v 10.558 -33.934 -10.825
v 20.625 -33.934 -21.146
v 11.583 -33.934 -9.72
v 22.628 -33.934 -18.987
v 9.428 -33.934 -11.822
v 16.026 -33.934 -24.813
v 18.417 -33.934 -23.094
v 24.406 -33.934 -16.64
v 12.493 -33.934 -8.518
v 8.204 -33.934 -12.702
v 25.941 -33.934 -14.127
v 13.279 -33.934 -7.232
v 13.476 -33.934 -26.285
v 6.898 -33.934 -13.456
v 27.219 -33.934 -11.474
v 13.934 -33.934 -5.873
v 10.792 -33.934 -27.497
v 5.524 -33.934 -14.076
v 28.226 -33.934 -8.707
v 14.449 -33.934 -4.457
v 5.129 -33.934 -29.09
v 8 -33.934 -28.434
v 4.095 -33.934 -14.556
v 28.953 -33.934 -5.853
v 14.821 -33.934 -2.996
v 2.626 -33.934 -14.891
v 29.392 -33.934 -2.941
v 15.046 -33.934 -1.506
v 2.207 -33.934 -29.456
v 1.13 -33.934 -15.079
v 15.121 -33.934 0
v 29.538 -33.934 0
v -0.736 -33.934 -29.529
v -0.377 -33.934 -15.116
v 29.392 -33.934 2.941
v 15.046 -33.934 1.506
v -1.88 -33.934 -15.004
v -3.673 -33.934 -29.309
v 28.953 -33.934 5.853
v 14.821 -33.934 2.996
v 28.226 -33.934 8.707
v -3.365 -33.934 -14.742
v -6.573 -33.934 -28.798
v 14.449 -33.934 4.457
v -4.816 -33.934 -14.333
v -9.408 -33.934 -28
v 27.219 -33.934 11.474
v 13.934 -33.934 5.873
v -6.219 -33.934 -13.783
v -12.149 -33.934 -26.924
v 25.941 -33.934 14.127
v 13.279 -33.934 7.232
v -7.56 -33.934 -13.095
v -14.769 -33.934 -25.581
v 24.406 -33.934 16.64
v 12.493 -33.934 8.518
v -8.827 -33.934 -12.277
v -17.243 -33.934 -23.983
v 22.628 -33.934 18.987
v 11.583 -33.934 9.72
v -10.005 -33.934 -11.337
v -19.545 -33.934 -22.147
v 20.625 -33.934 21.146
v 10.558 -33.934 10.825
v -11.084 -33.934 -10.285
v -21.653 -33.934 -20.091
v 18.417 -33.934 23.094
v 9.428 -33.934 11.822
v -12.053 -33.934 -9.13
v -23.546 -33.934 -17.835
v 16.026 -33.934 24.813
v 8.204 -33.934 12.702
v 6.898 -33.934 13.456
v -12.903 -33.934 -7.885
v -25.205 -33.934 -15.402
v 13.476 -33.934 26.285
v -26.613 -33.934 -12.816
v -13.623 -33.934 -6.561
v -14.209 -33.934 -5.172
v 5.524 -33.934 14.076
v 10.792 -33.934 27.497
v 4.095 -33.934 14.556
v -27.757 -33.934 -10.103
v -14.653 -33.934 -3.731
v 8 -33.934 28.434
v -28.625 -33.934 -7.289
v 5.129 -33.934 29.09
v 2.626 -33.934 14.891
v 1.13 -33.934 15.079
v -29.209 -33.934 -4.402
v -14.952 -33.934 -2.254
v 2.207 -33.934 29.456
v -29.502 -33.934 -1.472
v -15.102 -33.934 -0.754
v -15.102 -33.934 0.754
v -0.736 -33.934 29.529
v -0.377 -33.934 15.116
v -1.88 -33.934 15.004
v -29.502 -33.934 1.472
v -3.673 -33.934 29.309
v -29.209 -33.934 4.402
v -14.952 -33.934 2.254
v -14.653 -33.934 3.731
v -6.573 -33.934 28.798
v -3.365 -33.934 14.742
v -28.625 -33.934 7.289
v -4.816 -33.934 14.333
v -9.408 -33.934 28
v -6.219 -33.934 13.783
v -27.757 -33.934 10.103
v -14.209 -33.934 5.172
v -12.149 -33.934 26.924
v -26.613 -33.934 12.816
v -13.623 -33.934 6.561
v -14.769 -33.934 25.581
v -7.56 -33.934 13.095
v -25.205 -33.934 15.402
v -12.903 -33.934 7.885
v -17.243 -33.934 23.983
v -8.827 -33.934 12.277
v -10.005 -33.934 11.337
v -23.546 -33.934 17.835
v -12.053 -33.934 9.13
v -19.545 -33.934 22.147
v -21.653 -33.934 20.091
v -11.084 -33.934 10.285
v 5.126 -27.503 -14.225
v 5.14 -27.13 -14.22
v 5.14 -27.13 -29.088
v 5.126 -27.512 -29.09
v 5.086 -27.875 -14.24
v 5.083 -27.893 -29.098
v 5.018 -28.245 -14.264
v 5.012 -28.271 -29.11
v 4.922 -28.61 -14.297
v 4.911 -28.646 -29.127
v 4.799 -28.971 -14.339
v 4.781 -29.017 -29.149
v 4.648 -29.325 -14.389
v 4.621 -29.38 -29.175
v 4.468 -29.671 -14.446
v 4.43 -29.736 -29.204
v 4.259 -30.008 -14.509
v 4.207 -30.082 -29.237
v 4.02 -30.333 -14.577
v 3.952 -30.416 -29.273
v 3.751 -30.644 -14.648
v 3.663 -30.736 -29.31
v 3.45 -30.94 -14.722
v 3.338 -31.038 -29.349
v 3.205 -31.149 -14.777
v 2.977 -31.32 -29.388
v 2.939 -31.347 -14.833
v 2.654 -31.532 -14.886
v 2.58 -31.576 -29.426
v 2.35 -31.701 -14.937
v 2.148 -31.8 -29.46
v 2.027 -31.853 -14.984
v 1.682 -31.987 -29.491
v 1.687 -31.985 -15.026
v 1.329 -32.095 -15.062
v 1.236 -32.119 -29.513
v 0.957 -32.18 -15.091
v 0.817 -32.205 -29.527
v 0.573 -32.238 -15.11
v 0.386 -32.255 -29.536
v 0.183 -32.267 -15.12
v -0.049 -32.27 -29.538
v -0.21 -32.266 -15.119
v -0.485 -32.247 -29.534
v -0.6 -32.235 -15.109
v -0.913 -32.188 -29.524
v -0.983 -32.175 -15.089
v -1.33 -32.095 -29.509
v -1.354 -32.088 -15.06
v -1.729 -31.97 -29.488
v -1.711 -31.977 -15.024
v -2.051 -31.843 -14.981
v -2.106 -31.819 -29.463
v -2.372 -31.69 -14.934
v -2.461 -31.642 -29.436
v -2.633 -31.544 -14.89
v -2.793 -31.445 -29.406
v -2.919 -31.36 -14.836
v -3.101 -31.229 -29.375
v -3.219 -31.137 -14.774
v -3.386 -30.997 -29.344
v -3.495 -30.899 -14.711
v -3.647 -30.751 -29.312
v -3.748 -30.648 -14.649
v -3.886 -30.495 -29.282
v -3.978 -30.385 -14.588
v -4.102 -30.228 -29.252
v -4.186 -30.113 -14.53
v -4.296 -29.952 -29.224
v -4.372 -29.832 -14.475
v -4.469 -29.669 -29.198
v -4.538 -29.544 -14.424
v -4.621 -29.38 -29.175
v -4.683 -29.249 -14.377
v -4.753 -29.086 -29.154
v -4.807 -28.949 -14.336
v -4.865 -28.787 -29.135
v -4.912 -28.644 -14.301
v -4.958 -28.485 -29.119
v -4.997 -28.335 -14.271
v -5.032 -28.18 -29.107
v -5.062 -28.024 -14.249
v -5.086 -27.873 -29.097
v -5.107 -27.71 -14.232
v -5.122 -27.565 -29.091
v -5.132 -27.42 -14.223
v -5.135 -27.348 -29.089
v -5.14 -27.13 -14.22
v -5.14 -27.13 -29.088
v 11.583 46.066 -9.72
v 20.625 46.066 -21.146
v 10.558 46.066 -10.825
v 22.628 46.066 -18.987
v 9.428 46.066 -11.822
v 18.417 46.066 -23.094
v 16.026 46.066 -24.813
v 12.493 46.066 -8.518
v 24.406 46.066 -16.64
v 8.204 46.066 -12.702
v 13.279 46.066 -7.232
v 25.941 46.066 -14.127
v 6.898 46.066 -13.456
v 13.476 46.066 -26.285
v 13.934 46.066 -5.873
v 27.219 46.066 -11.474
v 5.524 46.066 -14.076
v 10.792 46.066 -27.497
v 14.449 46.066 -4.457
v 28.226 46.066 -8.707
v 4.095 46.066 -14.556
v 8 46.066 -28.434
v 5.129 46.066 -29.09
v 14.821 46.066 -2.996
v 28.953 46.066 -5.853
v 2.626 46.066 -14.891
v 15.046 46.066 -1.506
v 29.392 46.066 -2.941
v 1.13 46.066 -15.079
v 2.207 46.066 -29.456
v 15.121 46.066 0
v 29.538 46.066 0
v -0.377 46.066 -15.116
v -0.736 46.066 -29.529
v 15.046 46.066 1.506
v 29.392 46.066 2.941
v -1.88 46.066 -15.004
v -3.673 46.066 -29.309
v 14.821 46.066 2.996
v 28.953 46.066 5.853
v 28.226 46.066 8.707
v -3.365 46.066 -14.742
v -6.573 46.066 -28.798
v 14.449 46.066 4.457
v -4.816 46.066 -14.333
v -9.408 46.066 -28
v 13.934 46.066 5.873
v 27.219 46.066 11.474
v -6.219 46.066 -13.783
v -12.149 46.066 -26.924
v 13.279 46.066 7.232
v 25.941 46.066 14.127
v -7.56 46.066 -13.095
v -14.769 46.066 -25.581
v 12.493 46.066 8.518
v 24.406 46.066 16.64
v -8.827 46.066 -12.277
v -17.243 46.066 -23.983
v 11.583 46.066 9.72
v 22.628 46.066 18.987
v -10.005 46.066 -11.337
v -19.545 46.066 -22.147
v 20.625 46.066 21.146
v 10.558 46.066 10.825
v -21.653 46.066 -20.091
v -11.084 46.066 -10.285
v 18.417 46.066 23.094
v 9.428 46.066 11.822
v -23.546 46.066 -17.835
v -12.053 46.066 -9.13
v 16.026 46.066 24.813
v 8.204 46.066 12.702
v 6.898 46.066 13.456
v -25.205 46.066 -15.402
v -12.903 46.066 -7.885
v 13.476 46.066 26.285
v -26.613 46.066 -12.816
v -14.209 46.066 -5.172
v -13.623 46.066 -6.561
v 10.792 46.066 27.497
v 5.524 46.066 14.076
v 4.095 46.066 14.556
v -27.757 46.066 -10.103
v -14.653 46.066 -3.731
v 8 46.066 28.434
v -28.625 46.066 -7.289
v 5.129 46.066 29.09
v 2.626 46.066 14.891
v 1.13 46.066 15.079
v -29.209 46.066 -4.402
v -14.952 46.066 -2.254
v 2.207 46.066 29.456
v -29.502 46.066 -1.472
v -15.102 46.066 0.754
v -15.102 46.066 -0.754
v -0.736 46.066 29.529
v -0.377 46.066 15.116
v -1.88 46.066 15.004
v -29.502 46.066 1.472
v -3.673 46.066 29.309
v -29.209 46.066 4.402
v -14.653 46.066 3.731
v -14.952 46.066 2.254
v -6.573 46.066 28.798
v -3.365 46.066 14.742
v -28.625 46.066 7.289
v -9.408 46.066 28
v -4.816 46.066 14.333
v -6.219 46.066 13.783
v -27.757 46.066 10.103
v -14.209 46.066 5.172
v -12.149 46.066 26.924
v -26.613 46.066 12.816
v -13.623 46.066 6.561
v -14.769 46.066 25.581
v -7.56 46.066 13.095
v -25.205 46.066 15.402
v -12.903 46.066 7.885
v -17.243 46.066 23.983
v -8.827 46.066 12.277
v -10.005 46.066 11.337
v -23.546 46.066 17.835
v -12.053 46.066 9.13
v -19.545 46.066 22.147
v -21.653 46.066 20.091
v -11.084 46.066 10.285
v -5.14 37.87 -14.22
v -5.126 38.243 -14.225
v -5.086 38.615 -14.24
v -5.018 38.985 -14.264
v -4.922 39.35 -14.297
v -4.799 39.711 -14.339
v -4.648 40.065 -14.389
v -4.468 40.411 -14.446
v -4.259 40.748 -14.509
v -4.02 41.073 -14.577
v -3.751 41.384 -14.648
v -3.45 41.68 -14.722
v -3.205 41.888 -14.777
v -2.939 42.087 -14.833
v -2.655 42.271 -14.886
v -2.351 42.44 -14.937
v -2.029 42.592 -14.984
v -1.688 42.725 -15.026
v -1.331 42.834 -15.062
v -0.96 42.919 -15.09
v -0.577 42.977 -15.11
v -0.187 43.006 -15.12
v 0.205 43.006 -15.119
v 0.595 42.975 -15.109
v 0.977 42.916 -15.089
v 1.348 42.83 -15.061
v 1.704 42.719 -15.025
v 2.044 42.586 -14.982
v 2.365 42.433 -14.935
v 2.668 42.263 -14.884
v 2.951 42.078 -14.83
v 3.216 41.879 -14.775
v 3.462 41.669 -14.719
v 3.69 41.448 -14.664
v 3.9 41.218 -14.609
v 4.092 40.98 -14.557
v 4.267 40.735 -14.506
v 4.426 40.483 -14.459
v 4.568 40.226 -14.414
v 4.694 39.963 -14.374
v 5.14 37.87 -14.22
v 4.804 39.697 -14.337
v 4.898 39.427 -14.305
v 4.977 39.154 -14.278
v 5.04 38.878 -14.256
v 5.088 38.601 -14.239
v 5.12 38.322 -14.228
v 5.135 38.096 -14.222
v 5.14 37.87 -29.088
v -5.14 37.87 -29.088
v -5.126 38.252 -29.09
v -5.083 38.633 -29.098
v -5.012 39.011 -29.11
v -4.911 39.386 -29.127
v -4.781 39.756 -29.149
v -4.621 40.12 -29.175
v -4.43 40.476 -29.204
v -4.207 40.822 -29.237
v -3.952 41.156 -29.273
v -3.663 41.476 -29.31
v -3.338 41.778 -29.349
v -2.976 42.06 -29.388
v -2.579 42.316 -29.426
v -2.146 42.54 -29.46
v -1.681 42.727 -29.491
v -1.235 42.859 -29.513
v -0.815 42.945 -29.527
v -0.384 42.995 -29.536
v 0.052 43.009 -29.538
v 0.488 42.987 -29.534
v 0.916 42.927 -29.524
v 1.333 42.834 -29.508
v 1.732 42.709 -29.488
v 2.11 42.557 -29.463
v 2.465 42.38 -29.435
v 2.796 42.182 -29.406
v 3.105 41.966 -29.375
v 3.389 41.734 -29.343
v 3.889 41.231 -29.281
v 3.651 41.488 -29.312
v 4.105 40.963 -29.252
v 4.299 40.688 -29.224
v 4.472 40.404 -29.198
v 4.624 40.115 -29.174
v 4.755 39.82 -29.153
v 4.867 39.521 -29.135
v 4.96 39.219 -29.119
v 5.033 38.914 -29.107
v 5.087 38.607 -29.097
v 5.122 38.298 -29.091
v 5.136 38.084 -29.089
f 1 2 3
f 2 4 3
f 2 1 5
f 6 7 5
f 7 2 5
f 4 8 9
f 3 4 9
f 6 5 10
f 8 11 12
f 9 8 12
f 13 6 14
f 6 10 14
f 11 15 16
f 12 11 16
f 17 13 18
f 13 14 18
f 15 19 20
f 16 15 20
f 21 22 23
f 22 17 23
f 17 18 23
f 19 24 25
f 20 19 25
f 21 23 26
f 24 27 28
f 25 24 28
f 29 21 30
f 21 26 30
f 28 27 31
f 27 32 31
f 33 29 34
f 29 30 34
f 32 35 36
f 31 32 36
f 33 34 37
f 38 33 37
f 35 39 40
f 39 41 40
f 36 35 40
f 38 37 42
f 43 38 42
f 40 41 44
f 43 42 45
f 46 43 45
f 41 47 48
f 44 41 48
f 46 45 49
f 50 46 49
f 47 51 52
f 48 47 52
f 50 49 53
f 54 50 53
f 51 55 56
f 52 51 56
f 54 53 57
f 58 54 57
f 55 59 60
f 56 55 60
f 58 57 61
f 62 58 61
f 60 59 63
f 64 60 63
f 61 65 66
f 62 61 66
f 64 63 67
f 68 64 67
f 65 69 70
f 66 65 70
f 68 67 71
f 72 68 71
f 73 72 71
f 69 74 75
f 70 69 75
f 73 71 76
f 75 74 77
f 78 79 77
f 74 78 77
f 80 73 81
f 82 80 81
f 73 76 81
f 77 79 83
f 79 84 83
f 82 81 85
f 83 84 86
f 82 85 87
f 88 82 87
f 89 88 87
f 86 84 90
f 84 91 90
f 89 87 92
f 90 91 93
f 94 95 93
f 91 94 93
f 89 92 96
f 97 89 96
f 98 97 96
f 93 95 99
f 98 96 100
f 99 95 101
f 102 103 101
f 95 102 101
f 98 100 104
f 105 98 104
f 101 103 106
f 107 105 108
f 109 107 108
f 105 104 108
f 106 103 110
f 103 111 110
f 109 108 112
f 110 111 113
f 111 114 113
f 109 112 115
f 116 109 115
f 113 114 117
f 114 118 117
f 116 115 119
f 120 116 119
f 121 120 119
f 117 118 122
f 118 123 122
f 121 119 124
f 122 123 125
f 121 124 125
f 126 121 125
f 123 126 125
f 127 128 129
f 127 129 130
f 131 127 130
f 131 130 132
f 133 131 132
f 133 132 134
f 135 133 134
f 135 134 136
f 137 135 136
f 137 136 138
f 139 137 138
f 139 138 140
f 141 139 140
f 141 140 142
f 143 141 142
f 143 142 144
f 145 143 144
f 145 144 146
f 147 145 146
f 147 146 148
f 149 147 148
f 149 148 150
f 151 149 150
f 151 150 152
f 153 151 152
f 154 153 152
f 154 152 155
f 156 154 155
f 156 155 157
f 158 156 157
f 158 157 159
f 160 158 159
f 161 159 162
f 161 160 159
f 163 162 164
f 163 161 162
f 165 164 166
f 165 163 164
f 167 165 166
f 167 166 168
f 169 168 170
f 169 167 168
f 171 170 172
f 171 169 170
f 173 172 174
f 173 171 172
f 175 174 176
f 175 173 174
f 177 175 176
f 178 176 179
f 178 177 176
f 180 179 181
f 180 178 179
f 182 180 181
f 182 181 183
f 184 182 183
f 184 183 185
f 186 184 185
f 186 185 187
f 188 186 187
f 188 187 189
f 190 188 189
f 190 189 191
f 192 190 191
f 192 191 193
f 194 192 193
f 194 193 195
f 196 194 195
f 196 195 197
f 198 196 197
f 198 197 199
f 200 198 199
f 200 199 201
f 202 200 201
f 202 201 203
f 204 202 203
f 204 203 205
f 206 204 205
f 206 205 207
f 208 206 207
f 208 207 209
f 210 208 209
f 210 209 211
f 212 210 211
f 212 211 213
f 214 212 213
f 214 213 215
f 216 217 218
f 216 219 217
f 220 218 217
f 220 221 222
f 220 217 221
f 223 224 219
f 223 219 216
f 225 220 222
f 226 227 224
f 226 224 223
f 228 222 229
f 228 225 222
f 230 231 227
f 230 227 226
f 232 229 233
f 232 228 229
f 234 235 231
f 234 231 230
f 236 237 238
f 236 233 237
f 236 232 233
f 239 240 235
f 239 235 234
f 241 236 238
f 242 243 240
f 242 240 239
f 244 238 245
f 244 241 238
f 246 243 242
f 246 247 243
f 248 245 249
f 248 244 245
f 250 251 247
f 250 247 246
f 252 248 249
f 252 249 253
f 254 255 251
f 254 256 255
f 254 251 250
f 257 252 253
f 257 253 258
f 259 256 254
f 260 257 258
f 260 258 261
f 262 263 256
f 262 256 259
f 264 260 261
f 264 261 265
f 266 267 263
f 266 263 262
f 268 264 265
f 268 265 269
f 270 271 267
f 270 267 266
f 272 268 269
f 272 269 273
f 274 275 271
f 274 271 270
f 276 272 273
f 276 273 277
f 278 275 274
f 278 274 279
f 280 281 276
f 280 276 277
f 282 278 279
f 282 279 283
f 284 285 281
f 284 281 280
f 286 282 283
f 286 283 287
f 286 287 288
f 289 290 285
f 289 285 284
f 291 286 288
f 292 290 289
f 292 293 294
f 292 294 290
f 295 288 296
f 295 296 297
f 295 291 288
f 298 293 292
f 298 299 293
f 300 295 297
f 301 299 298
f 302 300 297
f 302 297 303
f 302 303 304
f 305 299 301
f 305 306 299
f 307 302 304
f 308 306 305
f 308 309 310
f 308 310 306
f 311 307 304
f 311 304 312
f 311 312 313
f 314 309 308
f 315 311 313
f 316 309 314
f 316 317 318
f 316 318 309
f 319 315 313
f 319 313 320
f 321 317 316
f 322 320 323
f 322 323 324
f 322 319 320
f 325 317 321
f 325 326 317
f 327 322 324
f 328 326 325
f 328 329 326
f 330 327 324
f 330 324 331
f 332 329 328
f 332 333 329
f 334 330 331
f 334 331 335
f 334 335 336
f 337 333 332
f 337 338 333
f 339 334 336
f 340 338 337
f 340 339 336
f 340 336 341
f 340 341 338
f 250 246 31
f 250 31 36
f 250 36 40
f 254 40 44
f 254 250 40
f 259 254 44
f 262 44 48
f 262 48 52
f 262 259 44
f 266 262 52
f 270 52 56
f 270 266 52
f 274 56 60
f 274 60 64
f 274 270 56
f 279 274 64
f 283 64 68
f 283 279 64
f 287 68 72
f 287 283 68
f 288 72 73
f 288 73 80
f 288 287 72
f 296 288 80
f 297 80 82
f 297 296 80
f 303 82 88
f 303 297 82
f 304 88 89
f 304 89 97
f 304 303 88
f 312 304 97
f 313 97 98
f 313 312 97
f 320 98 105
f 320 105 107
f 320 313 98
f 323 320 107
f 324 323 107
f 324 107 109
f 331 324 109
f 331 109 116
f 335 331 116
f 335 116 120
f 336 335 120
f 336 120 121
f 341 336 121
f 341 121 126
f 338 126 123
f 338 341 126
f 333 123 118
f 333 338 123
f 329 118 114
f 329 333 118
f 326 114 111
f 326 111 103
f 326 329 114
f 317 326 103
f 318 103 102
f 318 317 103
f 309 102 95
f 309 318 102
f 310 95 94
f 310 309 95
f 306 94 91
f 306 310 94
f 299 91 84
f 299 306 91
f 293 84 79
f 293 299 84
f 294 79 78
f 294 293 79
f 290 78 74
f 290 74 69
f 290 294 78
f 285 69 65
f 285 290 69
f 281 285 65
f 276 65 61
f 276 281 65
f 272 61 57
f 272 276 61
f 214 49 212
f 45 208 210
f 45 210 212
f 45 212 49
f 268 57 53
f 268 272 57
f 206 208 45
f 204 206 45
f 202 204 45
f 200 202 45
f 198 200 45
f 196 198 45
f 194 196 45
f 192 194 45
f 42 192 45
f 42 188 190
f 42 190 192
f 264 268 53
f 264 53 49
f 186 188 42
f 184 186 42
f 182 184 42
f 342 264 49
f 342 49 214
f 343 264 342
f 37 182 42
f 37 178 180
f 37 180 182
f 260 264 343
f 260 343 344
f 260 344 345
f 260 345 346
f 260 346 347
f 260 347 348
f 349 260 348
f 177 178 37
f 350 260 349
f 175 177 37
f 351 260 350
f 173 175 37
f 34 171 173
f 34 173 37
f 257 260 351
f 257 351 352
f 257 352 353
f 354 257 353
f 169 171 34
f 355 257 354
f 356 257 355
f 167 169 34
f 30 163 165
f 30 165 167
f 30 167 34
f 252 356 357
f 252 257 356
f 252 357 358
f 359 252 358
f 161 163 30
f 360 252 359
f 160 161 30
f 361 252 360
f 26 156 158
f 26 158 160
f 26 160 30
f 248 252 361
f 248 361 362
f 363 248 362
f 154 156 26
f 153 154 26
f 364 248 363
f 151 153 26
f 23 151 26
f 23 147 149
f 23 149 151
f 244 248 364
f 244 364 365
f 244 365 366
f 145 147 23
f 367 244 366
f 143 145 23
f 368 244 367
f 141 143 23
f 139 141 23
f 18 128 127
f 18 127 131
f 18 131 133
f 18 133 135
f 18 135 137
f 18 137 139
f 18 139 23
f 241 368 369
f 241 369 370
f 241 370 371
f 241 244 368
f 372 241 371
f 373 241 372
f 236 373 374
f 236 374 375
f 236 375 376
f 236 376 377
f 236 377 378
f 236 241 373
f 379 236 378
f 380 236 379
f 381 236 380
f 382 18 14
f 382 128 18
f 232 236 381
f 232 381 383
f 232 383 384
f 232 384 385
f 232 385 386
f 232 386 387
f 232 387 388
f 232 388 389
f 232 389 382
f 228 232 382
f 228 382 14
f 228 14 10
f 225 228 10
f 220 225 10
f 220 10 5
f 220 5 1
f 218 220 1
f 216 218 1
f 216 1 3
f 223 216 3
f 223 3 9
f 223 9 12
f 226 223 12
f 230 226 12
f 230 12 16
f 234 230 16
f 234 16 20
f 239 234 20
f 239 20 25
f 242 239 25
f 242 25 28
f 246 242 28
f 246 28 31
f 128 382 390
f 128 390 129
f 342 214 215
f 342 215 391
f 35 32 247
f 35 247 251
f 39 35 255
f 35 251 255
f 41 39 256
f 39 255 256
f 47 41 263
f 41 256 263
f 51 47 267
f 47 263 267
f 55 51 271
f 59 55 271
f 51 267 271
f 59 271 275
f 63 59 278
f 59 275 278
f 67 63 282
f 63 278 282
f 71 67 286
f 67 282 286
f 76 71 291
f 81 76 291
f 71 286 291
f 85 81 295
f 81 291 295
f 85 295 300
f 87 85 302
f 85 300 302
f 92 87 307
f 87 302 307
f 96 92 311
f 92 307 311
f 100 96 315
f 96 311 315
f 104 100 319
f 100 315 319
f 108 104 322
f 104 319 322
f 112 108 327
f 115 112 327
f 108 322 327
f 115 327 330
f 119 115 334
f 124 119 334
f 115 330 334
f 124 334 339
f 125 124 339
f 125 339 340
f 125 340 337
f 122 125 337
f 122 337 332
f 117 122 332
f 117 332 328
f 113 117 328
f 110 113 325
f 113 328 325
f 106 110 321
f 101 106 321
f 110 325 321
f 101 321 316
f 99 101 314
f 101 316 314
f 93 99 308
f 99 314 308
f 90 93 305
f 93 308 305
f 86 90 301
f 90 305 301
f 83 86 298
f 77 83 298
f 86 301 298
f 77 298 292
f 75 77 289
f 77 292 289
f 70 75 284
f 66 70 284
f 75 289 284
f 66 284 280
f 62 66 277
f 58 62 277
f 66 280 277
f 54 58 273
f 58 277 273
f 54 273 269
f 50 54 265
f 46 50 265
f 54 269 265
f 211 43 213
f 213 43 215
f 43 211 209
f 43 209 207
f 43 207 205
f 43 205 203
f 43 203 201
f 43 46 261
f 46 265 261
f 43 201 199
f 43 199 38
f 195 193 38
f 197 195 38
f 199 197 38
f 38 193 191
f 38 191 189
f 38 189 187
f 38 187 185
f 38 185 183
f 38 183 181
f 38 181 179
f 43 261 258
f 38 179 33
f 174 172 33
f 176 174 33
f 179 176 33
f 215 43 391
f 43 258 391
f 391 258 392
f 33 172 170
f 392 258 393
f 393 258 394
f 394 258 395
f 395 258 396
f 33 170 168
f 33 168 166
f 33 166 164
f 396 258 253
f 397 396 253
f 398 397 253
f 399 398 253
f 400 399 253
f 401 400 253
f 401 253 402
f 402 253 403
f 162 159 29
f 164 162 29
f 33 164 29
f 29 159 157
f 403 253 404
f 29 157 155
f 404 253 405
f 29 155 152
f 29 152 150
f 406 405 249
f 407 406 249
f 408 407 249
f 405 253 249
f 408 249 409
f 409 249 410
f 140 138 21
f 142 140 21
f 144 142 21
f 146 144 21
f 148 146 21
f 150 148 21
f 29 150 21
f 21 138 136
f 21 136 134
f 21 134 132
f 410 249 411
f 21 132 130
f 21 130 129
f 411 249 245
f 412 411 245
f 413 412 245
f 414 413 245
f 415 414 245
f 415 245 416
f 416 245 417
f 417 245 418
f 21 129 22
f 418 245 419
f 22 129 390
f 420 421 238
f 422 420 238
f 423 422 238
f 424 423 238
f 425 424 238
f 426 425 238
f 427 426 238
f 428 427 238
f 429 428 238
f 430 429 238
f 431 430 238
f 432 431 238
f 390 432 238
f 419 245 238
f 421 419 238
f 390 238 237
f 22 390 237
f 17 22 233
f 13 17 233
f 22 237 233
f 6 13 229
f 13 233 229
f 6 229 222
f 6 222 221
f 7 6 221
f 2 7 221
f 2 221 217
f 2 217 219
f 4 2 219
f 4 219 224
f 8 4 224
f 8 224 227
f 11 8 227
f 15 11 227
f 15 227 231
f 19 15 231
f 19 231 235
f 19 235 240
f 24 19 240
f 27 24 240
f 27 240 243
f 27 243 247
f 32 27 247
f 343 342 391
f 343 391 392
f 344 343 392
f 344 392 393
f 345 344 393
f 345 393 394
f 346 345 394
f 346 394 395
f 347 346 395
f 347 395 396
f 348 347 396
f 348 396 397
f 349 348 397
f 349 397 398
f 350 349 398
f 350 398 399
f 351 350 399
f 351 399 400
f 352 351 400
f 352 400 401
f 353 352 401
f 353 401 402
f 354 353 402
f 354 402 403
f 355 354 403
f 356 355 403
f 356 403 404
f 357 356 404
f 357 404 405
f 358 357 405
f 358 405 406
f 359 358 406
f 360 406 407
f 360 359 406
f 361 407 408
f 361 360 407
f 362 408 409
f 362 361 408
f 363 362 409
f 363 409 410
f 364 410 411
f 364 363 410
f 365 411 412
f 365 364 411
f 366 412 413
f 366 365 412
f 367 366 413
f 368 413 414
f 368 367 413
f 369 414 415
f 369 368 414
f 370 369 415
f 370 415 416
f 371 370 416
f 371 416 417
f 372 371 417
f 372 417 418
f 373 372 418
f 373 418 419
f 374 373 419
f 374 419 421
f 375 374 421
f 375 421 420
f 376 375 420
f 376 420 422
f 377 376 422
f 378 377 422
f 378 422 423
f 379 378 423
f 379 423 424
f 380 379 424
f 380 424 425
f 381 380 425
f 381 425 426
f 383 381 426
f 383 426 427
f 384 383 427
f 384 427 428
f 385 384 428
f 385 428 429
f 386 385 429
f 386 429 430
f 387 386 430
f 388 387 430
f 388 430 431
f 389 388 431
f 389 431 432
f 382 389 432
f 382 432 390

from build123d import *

# Parameters (mm, degrees)
SKETCH1_W          = 14.417582417
SKETCH1_H          = 80
CUT_EXTRUDE1_DEPTH = 30.538461538


with BuildPart() as part:
    # Sketch1 → Revolve1 (revolve)
    with BuildSketch(Plane.XY):
        with Locations((22.32967033, 6.065934066)):
            Rectangle(SKETCH1_W, SKETCH1_H)
    revolve(axis=Axis((0, 46.065934066, 0), (0, -1, 0)))

    # Sketch2 → Cut-Extrude1 (cut, through all)
    with BuildSketch(Plane.XY):
        with BuildLine():
            Line((5.140001029, 37.869690433), (5.140001029, -27.129905913))
            ThreePointArc((5.140001029, -27.129905913), (0, -32.269906942), (-5.140001029, -27.129905913))
            Line((-5.140001029, -27.129905913), (-5.140001029, 37.869690433))
            ThreePointArc((-5.140001029, 37.869690433), (0, 43.009691462), (5.140001029, 37.869690433))
        make_face()
    extrude(amount=-CUT_EXTRUDE1_DEPTH, mode=Mode.SUBTRACT)


solid = part.part
